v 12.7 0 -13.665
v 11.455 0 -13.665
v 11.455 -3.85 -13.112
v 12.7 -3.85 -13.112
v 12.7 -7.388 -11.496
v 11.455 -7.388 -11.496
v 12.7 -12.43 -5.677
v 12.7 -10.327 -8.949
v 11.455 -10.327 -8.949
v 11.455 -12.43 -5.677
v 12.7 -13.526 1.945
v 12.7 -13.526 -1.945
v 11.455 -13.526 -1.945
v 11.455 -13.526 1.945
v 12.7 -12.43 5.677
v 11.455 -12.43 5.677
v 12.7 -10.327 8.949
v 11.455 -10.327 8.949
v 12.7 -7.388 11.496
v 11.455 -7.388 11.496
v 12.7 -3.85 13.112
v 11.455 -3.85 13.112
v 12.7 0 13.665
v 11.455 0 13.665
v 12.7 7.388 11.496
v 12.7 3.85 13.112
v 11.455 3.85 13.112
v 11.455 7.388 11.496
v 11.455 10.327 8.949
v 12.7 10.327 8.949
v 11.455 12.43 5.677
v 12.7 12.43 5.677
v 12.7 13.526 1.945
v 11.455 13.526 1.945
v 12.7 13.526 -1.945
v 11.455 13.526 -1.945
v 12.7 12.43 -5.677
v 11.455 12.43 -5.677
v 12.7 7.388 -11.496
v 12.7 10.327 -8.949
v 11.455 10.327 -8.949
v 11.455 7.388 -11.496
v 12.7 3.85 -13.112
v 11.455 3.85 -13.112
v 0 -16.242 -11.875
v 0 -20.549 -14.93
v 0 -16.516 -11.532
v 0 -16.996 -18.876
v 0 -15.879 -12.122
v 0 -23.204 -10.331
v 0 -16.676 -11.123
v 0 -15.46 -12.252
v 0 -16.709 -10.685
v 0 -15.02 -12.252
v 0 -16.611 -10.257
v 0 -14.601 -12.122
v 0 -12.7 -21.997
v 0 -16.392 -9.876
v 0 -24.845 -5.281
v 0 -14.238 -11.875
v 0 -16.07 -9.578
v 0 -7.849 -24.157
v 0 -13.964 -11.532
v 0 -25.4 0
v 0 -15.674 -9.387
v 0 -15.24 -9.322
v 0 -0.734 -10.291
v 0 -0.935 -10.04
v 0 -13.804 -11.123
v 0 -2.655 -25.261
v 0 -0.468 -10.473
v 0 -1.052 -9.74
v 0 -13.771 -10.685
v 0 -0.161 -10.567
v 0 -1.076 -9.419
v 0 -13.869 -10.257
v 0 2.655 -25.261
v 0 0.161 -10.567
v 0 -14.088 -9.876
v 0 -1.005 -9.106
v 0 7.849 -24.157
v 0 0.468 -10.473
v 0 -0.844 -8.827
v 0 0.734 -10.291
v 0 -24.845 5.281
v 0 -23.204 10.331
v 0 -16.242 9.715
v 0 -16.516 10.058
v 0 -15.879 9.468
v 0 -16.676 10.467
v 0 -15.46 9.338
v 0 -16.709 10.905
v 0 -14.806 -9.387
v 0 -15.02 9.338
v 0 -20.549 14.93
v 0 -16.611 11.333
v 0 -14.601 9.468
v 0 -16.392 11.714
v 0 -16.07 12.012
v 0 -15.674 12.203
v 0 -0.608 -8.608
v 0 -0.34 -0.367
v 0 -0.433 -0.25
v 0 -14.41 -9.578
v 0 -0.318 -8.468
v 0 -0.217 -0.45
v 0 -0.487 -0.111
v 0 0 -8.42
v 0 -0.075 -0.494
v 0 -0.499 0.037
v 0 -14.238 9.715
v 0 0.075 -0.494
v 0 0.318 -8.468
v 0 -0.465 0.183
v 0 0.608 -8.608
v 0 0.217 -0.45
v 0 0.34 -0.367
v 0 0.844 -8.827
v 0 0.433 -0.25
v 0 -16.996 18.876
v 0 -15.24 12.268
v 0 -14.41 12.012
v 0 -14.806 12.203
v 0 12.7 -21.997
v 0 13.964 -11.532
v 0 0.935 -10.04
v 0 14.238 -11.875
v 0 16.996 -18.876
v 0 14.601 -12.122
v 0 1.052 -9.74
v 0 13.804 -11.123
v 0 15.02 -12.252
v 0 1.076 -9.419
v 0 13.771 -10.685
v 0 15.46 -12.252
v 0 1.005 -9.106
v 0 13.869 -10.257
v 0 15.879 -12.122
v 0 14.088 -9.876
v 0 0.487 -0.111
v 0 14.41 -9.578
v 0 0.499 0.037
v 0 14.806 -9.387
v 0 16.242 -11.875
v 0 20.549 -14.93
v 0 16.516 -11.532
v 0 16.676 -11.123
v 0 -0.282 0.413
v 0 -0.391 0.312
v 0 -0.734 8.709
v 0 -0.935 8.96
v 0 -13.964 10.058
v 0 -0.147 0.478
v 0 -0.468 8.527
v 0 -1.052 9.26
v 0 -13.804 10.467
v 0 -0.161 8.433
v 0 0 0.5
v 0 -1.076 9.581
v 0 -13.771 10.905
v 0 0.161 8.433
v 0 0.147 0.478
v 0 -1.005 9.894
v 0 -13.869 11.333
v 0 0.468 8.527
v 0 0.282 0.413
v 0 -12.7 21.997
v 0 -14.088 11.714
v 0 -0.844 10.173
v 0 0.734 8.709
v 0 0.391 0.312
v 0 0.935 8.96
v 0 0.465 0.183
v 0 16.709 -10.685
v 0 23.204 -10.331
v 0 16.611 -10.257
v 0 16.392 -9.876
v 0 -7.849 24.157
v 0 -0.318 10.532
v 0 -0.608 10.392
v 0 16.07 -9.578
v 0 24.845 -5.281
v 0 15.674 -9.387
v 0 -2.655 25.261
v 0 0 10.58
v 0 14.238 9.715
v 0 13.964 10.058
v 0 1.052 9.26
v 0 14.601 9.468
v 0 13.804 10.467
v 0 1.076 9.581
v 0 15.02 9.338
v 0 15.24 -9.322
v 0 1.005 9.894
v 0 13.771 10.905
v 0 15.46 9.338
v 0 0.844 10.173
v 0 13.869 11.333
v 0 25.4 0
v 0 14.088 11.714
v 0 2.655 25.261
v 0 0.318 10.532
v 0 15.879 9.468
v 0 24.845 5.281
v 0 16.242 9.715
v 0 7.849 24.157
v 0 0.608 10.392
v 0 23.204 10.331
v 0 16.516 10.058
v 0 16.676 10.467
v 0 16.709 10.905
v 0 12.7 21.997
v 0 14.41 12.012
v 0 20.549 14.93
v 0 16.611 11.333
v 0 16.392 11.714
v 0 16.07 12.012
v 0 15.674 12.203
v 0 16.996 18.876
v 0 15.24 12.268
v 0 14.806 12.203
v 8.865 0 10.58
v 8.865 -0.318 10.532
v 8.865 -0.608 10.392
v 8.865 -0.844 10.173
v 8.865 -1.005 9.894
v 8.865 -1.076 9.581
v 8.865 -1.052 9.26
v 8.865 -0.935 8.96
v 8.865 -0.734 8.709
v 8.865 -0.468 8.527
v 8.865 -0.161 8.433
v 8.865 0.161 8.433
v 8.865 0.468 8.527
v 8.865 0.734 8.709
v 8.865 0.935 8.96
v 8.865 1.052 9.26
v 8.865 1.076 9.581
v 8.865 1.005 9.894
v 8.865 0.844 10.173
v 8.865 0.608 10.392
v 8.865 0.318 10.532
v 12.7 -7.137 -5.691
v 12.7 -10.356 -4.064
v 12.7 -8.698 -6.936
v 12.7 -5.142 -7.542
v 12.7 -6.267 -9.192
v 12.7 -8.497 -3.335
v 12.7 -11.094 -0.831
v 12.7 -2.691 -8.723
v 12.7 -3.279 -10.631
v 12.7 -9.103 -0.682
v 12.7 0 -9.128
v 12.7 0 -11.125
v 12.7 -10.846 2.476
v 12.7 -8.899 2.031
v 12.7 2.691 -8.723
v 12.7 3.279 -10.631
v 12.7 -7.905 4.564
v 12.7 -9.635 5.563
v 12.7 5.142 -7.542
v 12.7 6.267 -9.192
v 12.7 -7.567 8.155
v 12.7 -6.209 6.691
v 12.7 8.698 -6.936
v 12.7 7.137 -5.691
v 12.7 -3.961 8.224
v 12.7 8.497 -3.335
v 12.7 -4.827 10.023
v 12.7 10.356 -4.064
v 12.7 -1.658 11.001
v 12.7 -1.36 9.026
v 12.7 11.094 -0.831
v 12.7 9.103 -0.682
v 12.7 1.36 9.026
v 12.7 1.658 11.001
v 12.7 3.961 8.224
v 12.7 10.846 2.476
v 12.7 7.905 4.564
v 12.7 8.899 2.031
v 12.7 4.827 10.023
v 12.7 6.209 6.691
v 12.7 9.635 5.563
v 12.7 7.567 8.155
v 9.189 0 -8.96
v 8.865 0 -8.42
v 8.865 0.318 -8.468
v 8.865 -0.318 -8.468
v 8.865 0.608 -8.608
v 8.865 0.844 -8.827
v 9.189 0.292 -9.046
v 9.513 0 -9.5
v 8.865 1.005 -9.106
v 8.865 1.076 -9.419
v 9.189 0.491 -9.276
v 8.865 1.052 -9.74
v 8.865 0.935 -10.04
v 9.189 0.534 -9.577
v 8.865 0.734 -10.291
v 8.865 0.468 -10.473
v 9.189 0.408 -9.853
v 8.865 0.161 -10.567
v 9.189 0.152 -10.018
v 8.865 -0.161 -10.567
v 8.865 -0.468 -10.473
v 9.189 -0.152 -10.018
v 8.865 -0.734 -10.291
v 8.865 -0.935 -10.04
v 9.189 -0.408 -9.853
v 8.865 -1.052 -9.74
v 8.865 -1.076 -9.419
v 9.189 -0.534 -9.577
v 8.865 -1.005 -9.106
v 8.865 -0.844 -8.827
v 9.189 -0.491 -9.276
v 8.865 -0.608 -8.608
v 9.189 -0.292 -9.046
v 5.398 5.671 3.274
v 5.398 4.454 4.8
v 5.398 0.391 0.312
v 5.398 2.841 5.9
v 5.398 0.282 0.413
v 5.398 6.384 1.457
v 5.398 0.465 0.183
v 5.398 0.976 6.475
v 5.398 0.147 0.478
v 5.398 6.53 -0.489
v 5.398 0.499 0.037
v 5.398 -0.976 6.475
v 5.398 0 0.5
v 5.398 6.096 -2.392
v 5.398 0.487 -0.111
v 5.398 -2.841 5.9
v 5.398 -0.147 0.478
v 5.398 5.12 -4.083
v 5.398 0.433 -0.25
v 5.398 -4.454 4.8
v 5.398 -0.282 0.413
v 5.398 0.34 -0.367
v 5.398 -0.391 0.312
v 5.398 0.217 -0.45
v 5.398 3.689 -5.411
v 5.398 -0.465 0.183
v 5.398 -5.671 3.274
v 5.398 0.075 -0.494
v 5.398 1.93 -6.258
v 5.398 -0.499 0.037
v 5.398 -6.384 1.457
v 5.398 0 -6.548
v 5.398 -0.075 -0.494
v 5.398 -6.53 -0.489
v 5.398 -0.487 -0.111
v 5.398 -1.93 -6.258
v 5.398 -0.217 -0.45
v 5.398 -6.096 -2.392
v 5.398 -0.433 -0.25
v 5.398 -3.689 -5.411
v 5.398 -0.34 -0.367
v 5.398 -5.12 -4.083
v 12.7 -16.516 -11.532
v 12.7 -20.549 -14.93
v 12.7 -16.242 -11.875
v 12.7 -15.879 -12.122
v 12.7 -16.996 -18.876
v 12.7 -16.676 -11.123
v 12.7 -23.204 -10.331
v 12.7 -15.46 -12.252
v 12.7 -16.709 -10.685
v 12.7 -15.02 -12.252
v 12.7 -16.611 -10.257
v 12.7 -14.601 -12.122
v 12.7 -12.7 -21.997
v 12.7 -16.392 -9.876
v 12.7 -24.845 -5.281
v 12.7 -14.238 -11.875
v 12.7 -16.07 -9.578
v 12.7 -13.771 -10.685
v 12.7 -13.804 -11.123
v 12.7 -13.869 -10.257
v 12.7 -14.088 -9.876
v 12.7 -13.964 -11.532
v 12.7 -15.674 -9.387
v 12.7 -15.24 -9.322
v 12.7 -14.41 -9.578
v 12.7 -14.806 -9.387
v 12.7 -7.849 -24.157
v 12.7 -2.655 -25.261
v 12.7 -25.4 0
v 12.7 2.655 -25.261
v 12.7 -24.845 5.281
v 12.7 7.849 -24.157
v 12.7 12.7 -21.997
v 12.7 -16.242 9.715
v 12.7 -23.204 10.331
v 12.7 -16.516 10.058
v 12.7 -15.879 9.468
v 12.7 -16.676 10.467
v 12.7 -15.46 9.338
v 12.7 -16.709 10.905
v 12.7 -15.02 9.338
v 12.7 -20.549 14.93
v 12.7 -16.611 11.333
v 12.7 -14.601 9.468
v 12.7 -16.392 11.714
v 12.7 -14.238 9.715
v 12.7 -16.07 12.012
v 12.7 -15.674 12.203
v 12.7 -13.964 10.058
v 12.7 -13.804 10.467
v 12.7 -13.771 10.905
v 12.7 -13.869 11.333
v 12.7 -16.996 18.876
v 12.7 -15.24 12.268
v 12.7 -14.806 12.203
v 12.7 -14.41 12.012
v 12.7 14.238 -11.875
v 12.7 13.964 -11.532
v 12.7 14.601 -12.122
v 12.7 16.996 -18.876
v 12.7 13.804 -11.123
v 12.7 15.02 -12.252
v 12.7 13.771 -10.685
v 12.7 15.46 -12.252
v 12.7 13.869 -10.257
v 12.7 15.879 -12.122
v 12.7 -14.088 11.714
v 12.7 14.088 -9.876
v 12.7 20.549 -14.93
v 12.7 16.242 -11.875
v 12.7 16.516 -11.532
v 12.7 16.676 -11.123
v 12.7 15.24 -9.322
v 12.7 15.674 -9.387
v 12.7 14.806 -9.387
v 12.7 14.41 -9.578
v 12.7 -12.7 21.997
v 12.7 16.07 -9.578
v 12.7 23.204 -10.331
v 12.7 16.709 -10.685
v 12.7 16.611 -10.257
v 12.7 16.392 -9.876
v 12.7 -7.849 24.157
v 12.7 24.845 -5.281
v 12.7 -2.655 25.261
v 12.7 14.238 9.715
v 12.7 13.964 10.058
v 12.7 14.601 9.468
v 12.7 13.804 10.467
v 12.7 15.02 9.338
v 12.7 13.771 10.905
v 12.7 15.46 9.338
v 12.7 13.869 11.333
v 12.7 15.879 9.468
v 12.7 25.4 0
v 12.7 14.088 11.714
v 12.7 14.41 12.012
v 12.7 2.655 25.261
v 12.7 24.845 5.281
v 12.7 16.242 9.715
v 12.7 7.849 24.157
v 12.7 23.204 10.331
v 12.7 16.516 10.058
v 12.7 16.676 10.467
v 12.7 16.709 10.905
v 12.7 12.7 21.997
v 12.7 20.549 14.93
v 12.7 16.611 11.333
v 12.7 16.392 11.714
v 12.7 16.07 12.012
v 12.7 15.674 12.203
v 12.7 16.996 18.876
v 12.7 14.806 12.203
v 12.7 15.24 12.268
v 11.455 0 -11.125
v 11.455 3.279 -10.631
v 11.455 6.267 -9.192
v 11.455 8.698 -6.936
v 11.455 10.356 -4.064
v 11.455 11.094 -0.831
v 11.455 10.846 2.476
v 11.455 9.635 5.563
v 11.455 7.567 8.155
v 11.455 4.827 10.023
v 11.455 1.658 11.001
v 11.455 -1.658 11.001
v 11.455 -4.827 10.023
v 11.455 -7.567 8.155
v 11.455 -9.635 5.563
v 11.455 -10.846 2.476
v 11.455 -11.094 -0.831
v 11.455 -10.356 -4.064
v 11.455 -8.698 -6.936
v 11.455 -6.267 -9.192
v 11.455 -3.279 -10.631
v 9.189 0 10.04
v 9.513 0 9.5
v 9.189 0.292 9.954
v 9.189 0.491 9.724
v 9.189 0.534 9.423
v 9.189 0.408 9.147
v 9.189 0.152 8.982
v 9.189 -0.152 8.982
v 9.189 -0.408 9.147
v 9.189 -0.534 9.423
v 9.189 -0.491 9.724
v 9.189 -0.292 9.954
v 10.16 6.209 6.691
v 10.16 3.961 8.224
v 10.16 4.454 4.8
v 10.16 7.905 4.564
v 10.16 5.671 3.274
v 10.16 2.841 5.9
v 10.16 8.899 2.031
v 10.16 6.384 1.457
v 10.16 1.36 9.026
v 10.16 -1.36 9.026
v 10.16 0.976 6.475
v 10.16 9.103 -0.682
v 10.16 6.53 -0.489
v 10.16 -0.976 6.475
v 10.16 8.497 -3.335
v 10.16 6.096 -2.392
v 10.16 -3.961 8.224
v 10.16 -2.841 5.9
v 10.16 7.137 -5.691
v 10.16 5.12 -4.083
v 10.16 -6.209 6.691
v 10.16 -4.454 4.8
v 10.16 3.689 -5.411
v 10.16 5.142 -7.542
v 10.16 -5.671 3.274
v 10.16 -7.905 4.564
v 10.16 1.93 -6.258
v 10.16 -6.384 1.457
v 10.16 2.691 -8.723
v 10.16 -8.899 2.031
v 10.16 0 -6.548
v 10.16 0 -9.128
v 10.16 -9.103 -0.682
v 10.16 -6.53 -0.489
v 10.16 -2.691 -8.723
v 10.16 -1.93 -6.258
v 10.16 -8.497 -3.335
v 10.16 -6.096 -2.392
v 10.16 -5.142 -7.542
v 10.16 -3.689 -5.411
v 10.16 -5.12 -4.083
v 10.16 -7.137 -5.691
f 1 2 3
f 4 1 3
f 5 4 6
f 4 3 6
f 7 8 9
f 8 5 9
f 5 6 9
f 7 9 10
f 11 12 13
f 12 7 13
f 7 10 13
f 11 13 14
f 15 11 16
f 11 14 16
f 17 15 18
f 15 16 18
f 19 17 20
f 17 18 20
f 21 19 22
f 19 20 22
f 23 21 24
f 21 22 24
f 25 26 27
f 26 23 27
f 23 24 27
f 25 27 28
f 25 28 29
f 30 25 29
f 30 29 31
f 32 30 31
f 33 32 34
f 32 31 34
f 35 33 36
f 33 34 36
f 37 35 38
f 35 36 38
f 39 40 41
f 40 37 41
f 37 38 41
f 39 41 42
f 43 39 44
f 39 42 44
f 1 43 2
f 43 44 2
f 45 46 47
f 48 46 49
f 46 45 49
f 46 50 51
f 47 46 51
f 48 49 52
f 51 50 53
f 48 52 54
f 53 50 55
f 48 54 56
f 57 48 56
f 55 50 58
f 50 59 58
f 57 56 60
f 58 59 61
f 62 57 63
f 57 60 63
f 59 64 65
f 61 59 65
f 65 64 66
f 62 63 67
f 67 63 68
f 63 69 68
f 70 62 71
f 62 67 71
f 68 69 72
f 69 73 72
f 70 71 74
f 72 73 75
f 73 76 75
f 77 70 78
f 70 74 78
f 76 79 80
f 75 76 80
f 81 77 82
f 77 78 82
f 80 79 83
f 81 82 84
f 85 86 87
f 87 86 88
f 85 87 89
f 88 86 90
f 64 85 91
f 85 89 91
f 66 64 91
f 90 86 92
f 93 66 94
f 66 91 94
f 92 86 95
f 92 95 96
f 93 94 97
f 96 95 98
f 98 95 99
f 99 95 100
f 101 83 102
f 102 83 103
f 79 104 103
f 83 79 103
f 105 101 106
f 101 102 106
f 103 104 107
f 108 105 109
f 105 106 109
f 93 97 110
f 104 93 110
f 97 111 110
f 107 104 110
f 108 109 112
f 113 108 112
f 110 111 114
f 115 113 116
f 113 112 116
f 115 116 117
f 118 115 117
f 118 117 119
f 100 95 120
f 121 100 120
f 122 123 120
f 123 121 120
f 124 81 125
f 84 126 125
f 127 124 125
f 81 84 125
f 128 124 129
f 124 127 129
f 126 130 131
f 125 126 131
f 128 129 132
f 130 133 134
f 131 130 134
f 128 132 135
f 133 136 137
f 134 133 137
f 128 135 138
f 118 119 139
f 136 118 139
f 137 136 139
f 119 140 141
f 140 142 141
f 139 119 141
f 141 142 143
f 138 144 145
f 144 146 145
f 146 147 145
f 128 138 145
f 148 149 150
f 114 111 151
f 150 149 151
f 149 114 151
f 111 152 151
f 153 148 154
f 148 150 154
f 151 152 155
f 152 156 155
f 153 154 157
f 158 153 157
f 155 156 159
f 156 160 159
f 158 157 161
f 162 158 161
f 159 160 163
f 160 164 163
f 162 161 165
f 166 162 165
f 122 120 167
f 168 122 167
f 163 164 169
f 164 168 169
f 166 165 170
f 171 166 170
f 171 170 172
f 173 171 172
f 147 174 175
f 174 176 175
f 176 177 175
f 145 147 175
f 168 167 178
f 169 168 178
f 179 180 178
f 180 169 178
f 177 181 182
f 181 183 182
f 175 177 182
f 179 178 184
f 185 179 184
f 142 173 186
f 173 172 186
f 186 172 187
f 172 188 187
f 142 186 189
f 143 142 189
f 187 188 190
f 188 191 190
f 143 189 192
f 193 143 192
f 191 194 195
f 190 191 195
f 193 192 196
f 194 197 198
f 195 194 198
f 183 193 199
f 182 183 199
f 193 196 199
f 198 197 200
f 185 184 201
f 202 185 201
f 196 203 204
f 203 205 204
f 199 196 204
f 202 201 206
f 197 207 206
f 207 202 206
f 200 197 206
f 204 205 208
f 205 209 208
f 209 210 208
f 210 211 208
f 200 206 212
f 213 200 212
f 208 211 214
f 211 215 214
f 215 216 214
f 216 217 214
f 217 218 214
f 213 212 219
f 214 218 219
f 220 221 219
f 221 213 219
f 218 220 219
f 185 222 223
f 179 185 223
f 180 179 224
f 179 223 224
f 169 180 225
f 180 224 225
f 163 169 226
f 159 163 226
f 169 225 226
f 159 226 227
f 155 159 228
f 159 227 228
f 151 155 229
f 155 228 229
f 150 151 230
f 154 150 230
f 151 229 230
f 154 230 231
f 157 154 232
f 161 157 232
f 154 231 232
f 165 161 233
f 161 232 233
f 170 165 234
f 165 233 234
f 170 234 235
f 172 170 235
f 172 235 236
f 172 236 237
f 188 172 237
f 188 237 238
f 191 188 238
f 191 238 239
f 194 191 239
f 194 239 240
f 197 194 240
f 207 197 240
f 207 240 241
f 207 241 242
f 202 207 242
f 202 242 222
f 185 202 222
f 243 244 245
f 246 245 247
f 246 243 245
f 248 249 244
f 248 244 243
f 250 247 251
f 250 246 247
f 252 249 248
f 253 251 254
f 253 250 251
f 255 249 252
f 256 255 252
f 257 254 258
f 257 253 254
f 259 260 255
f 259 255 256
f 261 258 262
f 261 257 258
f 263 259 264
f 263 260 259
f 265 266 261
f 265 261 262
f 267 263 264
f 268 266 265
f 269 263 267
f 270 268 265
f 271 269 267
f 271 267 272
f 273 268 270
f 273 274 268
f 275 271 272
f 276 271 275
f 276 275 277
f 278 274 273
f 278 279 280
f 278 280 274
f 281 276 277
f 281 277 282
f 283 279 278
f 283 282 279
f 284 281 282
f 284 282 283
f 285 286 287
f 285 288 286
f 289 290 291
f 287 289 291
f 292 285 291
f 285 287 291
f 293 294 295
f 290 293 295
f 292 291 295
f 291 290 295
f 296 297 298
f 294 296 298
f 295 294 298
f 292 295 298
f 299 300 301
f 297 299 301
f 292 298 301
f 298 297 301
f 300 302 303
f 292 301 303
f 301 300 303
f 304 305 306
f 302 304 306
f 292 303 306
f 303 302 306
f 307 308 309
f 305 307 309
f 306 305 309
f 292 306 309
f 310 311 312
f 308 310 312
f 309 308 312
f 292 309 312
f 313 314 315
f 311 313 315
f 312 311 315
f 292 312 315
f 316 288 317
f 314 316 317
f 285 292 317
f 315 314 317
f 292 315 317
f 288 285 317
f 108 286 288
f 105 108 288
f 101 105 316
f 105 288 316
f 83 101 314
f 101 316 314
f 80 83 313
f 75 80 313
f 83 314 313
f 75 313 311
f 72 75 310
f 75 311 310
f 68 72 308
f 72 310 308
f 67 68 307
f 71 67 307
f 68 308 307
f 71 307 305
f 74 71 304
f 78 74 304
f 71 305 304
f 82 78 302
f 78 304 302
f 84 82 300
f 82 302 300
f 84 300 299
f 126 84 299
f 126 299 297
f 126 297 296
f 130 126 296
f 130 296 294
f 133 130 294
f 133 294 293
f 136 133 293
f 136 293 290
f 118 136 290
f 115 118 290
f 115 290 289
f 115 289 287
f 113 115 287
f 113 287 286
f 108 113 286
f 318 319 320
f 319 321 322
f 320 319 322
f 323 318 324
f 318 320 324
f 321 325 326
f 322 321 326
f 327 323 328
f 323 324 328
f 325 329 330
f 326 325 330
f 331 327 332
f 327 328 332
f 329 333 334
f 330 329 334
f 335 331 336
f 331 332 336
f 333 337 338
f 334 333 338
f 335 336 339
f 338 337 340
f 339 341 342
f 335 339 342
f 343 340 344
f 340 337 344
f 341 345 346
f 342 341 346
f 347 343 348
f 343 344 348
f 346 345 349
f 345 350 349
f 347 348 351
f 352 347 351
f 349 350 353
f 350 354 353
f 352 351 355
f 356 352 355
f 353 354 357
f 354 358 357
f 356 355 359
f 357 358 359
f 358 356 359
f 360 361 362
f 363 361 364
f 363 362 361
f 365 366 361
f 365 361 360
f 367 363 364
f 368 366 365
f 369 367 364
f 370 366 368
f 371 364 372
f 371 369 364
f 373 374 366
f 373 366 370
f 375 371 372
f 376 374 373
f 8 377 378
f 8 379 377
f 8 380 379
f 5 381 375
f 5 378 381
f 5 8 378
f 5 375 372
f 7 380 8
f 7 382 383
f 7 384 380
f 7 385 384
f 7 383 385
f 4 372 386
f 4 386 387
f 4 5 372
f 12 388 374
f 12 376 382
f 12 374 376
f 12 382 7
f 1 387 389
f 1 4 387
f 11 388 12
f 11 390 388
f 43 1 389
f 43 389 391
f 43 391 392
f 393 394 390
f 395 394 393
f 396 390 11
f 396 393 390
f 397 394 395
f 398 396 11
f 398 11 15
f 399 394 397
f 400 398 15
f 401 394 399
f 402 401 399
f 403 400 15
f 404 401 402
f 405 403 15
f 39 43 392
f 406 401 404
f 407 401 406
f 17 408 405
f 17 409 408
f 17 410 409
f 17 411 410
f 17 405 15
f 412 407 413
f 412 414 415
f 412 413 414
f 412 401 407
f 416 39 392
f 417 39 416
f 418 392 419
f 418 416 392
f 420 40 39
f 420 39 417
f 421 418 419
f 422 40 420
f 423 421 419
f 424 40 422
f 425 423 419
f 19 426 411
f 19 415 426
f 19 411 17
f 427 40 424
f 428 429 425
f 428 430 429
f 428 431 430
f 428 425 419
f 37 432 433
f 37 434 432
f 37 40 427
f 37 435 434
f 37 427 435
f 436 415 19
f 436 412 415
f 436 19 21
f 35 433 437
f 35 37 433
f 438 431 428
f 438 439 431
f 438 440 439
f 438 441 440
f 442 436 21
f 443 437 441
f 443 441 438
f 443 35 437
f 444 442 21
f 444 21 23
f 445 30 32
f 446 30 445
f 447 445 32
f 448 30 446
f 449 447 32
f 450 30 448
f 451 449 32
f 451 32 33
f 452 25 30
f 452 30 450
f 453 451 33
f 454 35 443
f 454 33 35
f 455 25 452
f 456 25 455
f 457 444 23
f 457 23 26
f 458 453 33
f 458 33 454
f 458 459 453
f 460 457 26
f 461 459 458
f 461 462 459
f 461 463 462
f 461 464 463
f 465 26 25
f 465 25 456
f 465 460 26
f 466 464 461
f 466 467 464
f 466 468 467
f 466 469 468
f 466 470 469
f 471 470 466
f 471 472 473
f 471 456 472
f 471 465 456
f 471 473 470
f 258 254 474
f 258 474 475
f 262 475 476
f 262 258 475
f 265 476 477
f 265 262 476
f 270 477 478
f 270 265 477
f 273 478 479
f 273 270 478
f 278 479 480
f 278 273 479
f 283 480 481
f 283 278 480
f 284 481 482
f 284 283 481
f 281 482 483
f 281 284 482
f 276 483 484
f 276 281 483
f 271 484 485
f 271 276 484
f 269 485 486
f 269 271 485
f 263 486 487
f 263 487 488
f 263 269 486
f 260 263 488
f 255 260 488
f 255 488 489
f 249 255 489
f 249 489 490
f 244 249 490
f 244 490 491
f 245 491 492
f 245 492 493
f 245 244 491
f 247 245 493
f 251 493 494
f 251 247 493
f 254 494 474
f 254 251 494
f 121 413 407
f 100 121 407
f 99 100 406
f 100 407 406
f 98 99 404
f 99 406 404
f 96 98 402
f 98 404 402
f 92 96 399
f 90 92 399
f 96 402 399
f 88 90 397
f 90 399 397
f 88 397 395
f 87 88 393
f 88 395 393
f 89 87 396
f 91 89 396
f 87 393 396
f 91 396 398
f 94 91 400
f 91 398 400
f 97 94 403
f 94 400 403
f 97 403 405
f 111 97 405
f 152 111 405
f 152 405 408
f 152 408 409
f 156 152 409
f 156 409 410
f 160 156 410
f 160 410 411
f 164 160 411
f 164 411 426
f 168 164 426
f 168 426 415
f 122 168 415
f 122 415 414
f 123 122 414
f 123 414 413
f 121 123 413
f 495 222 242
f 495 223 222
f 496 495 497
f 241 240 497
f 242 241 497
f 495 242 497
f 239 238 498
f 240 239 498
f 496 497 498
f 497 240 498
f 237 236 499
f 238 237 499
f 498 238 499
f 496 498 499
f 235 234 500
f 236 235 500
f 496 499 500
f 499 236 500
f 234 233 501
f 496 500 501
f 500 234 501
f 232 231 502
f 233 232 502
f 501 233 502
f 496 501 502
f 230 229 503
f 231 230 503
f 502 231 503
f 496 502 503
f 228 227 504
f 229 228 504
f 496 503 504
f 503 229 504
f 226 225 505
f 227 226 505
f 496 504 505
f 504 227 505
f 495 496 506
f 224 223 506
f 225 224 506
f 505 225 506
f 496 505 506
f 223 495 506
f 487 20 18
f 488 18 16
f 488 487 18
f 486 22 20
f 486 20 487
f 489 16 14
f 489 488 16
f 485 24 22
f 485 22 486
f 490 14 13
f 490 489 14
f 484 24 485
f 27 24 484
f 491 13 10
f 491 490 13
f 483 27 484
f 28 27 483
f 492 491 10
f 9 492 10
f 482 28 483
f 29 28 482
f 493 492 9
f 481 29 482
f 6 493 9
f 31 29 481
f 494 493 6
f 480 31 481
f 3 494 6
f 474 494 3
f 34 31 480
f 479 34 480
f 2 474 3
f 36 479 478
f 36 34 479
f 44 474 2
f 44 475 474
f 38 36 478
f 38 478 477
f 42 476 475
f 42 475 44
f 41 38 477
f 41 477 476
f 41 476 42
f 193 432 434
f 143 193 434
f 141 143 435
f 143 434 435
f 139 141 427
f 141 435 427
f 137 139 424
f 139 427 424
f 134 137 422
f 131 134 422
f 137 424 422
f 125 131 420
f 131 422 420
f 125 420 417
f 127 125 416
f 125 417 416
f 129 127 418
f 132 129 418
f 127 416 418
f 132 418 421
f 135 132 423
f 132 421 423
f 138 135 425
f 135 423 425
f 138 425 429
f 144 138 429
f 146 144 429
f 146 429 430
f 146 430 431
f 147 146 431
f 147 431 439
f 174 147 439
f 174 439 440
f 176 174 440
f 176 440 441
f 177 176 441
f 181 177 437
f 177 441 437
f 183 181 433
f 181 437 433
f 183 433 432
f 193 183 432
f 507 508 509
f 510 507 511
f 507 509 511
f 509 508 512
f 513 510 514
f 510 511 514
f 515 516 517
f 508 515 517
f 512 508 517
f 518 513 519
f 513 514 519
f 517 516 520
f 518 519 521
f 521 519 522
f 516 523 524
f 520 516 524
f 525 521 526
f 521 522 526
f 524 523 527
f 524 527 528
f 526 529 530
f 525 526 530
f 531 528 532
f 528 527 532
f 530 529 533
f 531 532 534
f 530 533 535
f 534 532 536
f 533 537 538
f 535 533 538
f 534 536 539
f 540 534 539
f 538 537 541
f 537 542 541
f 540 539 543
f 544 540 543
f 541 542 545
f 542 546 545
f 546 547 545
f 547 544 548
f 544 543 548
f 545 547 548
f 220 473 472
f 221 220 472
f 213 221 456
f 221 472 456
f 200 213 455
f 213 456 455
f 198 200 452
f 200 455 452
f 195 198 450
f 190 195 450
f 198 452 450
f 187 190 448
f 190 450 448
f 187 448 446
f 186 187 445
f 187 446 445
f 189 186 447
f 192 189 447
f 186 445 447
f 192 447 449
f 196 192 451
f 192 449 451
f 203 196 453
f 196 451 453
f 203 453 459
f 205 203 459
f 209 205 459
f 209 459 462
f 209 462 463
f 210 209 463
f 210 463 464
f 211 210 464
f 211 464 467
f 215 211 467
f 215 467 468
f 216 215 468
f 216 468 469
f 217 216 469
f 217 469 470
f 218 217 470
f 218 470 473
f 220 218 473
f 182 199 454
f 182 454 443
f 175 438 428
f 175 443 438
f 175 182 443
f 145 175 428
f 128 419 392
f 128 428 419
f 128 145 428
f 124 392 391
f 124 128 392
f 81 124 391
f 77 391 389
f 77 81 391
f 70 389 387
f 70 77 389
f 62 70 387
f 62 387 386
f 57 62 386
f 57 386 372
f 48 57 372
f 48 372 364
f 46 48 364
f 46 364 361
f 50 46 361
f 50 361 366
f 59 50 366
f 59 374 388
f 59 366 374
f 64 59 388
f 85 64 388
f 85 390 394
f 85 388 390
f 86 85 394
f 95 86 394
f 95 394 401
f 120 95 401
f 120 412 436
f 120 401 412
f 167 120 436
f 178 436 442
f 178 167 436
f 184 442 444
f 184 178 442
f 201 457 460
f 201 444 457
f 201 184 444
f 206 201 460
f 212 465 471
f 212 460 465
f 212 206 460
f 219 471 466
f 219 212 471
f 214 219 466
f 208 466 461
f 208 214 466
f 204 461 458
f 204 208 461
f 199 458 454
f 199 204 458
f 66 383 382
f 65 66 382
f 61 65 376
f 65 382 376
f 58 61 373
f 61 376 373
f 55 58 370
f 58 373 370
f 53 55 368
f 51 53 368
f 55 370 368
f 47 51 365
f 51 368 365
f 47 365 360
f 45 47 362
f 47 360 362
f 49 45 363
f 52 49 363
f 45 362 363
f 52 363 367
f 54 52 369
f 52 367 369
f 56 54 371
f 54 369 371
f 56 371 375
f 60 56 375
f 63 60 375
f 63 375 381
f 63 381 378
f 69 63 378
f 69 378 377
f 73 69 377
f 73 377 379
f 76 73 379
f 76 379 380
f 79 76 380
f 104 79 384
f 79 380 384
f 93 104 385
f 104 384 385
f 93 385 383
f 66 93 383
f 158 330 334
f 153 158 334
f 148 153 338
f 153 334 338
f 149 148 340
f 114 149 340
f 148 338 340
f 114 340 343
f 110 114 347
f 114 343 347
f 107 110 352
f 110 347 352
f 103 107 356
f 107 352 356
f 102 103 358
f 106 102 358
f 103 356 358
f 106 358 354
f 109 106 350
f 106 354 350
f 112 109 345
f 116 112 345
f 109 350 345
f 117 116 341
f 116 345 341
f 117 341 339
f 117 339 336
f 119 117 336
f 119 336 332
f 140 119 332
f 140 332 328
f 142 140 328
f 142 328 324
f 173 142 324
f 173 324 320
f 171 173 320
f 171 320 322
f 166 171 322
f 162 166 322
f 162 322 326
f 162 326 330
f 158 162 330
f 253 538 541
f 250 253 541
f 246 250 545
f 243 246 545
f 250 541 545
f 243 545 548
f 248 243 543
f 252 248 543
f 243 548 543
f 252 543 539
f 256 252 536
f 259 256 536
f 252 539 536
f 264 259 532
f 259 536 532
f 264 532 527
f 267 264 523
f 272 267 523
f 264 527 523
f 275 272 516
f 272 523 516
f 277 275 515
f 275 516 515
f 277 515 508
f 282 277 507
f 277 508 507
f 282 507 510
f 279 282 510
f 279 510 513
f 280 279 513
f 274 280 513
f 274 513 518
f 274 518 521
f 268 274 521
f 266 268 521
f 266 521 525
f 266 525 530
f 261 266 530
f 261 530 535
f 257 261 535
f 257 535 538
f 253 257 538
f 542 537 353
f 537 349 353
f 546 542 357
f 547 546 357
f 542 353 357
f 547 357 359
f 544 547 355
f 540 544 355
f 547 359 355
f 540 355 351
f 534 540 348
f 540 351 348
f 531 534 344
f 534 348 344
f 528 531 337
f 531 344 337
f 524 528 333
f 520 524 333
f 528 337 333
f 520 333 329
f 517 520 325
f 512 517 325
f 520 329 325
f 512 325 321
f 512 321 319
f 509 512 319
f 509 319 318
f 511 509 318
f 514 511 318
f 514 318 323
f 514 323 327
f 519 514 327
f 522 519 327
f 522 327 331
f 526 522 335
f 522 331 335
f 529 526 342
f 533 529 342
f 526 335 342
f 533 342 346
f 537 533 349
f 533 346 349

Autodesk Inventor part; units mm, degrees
ref_plane "YZ Plane" through (0, 0, 0) normal (1, 0, 0) x (0, 1, 0)
ref_plane "XZ Plane" through (0, 0, 0) normal (0, 1, 0) x (-1, 0, 0)
ref_plane "XY Plane" through (0, 0, 0) normal (0, 0, 1) x (1, 0, 0)
sketch "Sketch1" plane through (0, 0, 0) normal (1, 0, 0) x (0, 1, 0)
  circle A0 centre (0, 0) radius 25.4
  dimension "d0" = 50.8
extrude "Extrusion1" add sketch "Sketch1" along normal blind 12.7
sketch "Sketch10" plane through (12.7, 0, 0) normal (1, 0, 0) x (0, 0, -1)
  point P0 (0, 0)
  point P1 (0, 0)
hole "Hole4" at (12.7, 0, 0) direction (-1, 0, 0) diameter 18.2563 depth 2.54
sketch "Sketch11" plane through (10.16, 0, 0) normal (1, 0, 0) x (0, 0, -1)
  point P0 (0, 0)
  point P1 (0, 0)
hole "Hole7" at (10.16, 0, 0) direction (-1, 0, 0) diameter 13.0969 depth 4.7625
sketch "Sketch12" plane through (0, 0, 0) normal (-1, 0, 0) x (0, 0, 1)
  line L0 (-10.795, 15.24) -> (10.795, 15.24) construction
  line L1 (10.795, 15.24) -> (10.795, -15.24) construction
  line L2 (10.795, -15.24) -> (-10.795, -15.24) construction
  line L3 (-10.795, -15.24) -> (-10.795, 15.24) construction
  line L4 (-10.795, 15.24) -> (10.795, -15.24) construction
  line L5 (10.795, 15.24) -> (-10.795, -15.24) construction
  point P0 (0, 0)
  dimension "d107" = 21.59
  dimension "d108" = 30.48
hole "Hole8" at (0, 15.24, 10.795) at (0, -15.24, 10.795) at (0, -15.24, -10.795) at (0, 15.24, -10.795) direction (1, 0, 0) diameter 2.9464 end through all clearance for "Socket Head Cap Screw" size "#4" standard "Ansi Unified Screw Threads"
sketch "Sketch13" plane through (0, 0, 0) normal (-1, 0, 0) x (0, 0, 1)
  point P0 (0, 0)
  point P1 (0, 0)
hole "Hole9" at (0, 0, 0) direction (1, 0, 0) diameter 1 end through all
sketch "Sketch9" plane through (0, 0, 0) normal (0, 1, 0) x (-1, 0, 0)
  line L0 (-11.4554, -11.1252) -> (-12.7, -11.1252)
  line L1 (-12.7, -11.1252) -> (-12.7, -13.6652)
  line L2 (-12.7, -13.6652) -> (-11.4554, -13.6652)
  line L3 (-11.4554, -13.6652) -> (-11.4554, -11.1252)
  line L4 (2.54, 0) -> (-15.24, 0) projected
  line L5 (-12.7, 25.4) -> (-12.7, -25.4) projected
  point P0 (0, 0)
  dimension "d55" = 2.54
  dimension "d56" = 1.2446
  dimension "d59" = 11.1252
revolve "Revolution1" cut sketch "Sketch9" angle 360 about axis through (-10, 0, 0) along (1, 0, 0)
sketch "Sketch14" plane through (0, 0, 0) normal (-1, 0, 0) x (0, 0, 1)
  line L0 (-9.5, 0) -> (9.5, 0)
  circle A0 centre (0, 0) radius 0.5 projected
  dimension "d123" = 19
  dimension "d124" = 9.5
hole "Hole10" at (0, 0, 9.5) at (0, 0, -9.5) direction (1, 0, 0) diameter 2.159 depth 8.8646 tip angle 118
equation "\"d0\" = sensorHolderDiameter"
equation "\"d1\" = sensorHolderThickness"
equation "\"d100\" = glassTubeDiameter + 2 * glassTubeClearance"
equation "\"d107\" = shortHoleSpacing"
equation "\"d108\" = longHoleSpacing"
equation "\"d116\" = fiberDiameter + 2 * fiberClearance"
equation "\"d55\" = oRingGrooveWidth"
equation "\"d56\" = oRingGrooveDepth"
equation "\"d59\" = 0.5 * oRingID"
equation "\"d123\" = sensorBoardHoleSpacing"
equation "\"d124\" = 0.5 * d123"
equation "\"tubeHeight\" = 50.8"
equation "\"tubeWidth\" = 152.4"
equation "\"tubeLength\" = 304.8"
equation "\"tubeWallThickness\" = 3.175"
equation "\"plateOverhang\" = 6.35"
equation "\"moatWidth\" = 3.175"
equation "\"moatDepth\" = 3.175"
equation "\"tubePlateClearance\" = 0.127"
equation "\"blankCapThickness\" = 9.525"
equation "\"sensorCapThickness\" = 12.7"
equation "\"glassTubeDiameter\" = 12.7"
equation "\"glassTubeClearance\" = 0.19844"
equation "\"longHoleSpacing\" = 30.48"
equation "\"shortHoleSpacing\" = 21.59"
equation "\"sensorHolderDiameter\" = 50.8"
equation "\"sensorHolderThickness\" = 12.7"
equation "\"fiberClearence\" = 0"
equation "\"fiberDiameter\" = 1"
equation "\"fiberClearance\" = 0"
equation "\"oRingGrooveDepth\" = 1.2446"
equation "\"oRingGrooveWidth\" = 2.54"
equation "\"oRingID\" = 22.2504"
equation "\"glassTubeLength\" = 279.4"
equation "\"glassTubeID\" = 7.874"
equation "\"sensorBoardHoleSpacing\" = 19"
properties part number ".5 in hole" material "Aluminum 6061"
